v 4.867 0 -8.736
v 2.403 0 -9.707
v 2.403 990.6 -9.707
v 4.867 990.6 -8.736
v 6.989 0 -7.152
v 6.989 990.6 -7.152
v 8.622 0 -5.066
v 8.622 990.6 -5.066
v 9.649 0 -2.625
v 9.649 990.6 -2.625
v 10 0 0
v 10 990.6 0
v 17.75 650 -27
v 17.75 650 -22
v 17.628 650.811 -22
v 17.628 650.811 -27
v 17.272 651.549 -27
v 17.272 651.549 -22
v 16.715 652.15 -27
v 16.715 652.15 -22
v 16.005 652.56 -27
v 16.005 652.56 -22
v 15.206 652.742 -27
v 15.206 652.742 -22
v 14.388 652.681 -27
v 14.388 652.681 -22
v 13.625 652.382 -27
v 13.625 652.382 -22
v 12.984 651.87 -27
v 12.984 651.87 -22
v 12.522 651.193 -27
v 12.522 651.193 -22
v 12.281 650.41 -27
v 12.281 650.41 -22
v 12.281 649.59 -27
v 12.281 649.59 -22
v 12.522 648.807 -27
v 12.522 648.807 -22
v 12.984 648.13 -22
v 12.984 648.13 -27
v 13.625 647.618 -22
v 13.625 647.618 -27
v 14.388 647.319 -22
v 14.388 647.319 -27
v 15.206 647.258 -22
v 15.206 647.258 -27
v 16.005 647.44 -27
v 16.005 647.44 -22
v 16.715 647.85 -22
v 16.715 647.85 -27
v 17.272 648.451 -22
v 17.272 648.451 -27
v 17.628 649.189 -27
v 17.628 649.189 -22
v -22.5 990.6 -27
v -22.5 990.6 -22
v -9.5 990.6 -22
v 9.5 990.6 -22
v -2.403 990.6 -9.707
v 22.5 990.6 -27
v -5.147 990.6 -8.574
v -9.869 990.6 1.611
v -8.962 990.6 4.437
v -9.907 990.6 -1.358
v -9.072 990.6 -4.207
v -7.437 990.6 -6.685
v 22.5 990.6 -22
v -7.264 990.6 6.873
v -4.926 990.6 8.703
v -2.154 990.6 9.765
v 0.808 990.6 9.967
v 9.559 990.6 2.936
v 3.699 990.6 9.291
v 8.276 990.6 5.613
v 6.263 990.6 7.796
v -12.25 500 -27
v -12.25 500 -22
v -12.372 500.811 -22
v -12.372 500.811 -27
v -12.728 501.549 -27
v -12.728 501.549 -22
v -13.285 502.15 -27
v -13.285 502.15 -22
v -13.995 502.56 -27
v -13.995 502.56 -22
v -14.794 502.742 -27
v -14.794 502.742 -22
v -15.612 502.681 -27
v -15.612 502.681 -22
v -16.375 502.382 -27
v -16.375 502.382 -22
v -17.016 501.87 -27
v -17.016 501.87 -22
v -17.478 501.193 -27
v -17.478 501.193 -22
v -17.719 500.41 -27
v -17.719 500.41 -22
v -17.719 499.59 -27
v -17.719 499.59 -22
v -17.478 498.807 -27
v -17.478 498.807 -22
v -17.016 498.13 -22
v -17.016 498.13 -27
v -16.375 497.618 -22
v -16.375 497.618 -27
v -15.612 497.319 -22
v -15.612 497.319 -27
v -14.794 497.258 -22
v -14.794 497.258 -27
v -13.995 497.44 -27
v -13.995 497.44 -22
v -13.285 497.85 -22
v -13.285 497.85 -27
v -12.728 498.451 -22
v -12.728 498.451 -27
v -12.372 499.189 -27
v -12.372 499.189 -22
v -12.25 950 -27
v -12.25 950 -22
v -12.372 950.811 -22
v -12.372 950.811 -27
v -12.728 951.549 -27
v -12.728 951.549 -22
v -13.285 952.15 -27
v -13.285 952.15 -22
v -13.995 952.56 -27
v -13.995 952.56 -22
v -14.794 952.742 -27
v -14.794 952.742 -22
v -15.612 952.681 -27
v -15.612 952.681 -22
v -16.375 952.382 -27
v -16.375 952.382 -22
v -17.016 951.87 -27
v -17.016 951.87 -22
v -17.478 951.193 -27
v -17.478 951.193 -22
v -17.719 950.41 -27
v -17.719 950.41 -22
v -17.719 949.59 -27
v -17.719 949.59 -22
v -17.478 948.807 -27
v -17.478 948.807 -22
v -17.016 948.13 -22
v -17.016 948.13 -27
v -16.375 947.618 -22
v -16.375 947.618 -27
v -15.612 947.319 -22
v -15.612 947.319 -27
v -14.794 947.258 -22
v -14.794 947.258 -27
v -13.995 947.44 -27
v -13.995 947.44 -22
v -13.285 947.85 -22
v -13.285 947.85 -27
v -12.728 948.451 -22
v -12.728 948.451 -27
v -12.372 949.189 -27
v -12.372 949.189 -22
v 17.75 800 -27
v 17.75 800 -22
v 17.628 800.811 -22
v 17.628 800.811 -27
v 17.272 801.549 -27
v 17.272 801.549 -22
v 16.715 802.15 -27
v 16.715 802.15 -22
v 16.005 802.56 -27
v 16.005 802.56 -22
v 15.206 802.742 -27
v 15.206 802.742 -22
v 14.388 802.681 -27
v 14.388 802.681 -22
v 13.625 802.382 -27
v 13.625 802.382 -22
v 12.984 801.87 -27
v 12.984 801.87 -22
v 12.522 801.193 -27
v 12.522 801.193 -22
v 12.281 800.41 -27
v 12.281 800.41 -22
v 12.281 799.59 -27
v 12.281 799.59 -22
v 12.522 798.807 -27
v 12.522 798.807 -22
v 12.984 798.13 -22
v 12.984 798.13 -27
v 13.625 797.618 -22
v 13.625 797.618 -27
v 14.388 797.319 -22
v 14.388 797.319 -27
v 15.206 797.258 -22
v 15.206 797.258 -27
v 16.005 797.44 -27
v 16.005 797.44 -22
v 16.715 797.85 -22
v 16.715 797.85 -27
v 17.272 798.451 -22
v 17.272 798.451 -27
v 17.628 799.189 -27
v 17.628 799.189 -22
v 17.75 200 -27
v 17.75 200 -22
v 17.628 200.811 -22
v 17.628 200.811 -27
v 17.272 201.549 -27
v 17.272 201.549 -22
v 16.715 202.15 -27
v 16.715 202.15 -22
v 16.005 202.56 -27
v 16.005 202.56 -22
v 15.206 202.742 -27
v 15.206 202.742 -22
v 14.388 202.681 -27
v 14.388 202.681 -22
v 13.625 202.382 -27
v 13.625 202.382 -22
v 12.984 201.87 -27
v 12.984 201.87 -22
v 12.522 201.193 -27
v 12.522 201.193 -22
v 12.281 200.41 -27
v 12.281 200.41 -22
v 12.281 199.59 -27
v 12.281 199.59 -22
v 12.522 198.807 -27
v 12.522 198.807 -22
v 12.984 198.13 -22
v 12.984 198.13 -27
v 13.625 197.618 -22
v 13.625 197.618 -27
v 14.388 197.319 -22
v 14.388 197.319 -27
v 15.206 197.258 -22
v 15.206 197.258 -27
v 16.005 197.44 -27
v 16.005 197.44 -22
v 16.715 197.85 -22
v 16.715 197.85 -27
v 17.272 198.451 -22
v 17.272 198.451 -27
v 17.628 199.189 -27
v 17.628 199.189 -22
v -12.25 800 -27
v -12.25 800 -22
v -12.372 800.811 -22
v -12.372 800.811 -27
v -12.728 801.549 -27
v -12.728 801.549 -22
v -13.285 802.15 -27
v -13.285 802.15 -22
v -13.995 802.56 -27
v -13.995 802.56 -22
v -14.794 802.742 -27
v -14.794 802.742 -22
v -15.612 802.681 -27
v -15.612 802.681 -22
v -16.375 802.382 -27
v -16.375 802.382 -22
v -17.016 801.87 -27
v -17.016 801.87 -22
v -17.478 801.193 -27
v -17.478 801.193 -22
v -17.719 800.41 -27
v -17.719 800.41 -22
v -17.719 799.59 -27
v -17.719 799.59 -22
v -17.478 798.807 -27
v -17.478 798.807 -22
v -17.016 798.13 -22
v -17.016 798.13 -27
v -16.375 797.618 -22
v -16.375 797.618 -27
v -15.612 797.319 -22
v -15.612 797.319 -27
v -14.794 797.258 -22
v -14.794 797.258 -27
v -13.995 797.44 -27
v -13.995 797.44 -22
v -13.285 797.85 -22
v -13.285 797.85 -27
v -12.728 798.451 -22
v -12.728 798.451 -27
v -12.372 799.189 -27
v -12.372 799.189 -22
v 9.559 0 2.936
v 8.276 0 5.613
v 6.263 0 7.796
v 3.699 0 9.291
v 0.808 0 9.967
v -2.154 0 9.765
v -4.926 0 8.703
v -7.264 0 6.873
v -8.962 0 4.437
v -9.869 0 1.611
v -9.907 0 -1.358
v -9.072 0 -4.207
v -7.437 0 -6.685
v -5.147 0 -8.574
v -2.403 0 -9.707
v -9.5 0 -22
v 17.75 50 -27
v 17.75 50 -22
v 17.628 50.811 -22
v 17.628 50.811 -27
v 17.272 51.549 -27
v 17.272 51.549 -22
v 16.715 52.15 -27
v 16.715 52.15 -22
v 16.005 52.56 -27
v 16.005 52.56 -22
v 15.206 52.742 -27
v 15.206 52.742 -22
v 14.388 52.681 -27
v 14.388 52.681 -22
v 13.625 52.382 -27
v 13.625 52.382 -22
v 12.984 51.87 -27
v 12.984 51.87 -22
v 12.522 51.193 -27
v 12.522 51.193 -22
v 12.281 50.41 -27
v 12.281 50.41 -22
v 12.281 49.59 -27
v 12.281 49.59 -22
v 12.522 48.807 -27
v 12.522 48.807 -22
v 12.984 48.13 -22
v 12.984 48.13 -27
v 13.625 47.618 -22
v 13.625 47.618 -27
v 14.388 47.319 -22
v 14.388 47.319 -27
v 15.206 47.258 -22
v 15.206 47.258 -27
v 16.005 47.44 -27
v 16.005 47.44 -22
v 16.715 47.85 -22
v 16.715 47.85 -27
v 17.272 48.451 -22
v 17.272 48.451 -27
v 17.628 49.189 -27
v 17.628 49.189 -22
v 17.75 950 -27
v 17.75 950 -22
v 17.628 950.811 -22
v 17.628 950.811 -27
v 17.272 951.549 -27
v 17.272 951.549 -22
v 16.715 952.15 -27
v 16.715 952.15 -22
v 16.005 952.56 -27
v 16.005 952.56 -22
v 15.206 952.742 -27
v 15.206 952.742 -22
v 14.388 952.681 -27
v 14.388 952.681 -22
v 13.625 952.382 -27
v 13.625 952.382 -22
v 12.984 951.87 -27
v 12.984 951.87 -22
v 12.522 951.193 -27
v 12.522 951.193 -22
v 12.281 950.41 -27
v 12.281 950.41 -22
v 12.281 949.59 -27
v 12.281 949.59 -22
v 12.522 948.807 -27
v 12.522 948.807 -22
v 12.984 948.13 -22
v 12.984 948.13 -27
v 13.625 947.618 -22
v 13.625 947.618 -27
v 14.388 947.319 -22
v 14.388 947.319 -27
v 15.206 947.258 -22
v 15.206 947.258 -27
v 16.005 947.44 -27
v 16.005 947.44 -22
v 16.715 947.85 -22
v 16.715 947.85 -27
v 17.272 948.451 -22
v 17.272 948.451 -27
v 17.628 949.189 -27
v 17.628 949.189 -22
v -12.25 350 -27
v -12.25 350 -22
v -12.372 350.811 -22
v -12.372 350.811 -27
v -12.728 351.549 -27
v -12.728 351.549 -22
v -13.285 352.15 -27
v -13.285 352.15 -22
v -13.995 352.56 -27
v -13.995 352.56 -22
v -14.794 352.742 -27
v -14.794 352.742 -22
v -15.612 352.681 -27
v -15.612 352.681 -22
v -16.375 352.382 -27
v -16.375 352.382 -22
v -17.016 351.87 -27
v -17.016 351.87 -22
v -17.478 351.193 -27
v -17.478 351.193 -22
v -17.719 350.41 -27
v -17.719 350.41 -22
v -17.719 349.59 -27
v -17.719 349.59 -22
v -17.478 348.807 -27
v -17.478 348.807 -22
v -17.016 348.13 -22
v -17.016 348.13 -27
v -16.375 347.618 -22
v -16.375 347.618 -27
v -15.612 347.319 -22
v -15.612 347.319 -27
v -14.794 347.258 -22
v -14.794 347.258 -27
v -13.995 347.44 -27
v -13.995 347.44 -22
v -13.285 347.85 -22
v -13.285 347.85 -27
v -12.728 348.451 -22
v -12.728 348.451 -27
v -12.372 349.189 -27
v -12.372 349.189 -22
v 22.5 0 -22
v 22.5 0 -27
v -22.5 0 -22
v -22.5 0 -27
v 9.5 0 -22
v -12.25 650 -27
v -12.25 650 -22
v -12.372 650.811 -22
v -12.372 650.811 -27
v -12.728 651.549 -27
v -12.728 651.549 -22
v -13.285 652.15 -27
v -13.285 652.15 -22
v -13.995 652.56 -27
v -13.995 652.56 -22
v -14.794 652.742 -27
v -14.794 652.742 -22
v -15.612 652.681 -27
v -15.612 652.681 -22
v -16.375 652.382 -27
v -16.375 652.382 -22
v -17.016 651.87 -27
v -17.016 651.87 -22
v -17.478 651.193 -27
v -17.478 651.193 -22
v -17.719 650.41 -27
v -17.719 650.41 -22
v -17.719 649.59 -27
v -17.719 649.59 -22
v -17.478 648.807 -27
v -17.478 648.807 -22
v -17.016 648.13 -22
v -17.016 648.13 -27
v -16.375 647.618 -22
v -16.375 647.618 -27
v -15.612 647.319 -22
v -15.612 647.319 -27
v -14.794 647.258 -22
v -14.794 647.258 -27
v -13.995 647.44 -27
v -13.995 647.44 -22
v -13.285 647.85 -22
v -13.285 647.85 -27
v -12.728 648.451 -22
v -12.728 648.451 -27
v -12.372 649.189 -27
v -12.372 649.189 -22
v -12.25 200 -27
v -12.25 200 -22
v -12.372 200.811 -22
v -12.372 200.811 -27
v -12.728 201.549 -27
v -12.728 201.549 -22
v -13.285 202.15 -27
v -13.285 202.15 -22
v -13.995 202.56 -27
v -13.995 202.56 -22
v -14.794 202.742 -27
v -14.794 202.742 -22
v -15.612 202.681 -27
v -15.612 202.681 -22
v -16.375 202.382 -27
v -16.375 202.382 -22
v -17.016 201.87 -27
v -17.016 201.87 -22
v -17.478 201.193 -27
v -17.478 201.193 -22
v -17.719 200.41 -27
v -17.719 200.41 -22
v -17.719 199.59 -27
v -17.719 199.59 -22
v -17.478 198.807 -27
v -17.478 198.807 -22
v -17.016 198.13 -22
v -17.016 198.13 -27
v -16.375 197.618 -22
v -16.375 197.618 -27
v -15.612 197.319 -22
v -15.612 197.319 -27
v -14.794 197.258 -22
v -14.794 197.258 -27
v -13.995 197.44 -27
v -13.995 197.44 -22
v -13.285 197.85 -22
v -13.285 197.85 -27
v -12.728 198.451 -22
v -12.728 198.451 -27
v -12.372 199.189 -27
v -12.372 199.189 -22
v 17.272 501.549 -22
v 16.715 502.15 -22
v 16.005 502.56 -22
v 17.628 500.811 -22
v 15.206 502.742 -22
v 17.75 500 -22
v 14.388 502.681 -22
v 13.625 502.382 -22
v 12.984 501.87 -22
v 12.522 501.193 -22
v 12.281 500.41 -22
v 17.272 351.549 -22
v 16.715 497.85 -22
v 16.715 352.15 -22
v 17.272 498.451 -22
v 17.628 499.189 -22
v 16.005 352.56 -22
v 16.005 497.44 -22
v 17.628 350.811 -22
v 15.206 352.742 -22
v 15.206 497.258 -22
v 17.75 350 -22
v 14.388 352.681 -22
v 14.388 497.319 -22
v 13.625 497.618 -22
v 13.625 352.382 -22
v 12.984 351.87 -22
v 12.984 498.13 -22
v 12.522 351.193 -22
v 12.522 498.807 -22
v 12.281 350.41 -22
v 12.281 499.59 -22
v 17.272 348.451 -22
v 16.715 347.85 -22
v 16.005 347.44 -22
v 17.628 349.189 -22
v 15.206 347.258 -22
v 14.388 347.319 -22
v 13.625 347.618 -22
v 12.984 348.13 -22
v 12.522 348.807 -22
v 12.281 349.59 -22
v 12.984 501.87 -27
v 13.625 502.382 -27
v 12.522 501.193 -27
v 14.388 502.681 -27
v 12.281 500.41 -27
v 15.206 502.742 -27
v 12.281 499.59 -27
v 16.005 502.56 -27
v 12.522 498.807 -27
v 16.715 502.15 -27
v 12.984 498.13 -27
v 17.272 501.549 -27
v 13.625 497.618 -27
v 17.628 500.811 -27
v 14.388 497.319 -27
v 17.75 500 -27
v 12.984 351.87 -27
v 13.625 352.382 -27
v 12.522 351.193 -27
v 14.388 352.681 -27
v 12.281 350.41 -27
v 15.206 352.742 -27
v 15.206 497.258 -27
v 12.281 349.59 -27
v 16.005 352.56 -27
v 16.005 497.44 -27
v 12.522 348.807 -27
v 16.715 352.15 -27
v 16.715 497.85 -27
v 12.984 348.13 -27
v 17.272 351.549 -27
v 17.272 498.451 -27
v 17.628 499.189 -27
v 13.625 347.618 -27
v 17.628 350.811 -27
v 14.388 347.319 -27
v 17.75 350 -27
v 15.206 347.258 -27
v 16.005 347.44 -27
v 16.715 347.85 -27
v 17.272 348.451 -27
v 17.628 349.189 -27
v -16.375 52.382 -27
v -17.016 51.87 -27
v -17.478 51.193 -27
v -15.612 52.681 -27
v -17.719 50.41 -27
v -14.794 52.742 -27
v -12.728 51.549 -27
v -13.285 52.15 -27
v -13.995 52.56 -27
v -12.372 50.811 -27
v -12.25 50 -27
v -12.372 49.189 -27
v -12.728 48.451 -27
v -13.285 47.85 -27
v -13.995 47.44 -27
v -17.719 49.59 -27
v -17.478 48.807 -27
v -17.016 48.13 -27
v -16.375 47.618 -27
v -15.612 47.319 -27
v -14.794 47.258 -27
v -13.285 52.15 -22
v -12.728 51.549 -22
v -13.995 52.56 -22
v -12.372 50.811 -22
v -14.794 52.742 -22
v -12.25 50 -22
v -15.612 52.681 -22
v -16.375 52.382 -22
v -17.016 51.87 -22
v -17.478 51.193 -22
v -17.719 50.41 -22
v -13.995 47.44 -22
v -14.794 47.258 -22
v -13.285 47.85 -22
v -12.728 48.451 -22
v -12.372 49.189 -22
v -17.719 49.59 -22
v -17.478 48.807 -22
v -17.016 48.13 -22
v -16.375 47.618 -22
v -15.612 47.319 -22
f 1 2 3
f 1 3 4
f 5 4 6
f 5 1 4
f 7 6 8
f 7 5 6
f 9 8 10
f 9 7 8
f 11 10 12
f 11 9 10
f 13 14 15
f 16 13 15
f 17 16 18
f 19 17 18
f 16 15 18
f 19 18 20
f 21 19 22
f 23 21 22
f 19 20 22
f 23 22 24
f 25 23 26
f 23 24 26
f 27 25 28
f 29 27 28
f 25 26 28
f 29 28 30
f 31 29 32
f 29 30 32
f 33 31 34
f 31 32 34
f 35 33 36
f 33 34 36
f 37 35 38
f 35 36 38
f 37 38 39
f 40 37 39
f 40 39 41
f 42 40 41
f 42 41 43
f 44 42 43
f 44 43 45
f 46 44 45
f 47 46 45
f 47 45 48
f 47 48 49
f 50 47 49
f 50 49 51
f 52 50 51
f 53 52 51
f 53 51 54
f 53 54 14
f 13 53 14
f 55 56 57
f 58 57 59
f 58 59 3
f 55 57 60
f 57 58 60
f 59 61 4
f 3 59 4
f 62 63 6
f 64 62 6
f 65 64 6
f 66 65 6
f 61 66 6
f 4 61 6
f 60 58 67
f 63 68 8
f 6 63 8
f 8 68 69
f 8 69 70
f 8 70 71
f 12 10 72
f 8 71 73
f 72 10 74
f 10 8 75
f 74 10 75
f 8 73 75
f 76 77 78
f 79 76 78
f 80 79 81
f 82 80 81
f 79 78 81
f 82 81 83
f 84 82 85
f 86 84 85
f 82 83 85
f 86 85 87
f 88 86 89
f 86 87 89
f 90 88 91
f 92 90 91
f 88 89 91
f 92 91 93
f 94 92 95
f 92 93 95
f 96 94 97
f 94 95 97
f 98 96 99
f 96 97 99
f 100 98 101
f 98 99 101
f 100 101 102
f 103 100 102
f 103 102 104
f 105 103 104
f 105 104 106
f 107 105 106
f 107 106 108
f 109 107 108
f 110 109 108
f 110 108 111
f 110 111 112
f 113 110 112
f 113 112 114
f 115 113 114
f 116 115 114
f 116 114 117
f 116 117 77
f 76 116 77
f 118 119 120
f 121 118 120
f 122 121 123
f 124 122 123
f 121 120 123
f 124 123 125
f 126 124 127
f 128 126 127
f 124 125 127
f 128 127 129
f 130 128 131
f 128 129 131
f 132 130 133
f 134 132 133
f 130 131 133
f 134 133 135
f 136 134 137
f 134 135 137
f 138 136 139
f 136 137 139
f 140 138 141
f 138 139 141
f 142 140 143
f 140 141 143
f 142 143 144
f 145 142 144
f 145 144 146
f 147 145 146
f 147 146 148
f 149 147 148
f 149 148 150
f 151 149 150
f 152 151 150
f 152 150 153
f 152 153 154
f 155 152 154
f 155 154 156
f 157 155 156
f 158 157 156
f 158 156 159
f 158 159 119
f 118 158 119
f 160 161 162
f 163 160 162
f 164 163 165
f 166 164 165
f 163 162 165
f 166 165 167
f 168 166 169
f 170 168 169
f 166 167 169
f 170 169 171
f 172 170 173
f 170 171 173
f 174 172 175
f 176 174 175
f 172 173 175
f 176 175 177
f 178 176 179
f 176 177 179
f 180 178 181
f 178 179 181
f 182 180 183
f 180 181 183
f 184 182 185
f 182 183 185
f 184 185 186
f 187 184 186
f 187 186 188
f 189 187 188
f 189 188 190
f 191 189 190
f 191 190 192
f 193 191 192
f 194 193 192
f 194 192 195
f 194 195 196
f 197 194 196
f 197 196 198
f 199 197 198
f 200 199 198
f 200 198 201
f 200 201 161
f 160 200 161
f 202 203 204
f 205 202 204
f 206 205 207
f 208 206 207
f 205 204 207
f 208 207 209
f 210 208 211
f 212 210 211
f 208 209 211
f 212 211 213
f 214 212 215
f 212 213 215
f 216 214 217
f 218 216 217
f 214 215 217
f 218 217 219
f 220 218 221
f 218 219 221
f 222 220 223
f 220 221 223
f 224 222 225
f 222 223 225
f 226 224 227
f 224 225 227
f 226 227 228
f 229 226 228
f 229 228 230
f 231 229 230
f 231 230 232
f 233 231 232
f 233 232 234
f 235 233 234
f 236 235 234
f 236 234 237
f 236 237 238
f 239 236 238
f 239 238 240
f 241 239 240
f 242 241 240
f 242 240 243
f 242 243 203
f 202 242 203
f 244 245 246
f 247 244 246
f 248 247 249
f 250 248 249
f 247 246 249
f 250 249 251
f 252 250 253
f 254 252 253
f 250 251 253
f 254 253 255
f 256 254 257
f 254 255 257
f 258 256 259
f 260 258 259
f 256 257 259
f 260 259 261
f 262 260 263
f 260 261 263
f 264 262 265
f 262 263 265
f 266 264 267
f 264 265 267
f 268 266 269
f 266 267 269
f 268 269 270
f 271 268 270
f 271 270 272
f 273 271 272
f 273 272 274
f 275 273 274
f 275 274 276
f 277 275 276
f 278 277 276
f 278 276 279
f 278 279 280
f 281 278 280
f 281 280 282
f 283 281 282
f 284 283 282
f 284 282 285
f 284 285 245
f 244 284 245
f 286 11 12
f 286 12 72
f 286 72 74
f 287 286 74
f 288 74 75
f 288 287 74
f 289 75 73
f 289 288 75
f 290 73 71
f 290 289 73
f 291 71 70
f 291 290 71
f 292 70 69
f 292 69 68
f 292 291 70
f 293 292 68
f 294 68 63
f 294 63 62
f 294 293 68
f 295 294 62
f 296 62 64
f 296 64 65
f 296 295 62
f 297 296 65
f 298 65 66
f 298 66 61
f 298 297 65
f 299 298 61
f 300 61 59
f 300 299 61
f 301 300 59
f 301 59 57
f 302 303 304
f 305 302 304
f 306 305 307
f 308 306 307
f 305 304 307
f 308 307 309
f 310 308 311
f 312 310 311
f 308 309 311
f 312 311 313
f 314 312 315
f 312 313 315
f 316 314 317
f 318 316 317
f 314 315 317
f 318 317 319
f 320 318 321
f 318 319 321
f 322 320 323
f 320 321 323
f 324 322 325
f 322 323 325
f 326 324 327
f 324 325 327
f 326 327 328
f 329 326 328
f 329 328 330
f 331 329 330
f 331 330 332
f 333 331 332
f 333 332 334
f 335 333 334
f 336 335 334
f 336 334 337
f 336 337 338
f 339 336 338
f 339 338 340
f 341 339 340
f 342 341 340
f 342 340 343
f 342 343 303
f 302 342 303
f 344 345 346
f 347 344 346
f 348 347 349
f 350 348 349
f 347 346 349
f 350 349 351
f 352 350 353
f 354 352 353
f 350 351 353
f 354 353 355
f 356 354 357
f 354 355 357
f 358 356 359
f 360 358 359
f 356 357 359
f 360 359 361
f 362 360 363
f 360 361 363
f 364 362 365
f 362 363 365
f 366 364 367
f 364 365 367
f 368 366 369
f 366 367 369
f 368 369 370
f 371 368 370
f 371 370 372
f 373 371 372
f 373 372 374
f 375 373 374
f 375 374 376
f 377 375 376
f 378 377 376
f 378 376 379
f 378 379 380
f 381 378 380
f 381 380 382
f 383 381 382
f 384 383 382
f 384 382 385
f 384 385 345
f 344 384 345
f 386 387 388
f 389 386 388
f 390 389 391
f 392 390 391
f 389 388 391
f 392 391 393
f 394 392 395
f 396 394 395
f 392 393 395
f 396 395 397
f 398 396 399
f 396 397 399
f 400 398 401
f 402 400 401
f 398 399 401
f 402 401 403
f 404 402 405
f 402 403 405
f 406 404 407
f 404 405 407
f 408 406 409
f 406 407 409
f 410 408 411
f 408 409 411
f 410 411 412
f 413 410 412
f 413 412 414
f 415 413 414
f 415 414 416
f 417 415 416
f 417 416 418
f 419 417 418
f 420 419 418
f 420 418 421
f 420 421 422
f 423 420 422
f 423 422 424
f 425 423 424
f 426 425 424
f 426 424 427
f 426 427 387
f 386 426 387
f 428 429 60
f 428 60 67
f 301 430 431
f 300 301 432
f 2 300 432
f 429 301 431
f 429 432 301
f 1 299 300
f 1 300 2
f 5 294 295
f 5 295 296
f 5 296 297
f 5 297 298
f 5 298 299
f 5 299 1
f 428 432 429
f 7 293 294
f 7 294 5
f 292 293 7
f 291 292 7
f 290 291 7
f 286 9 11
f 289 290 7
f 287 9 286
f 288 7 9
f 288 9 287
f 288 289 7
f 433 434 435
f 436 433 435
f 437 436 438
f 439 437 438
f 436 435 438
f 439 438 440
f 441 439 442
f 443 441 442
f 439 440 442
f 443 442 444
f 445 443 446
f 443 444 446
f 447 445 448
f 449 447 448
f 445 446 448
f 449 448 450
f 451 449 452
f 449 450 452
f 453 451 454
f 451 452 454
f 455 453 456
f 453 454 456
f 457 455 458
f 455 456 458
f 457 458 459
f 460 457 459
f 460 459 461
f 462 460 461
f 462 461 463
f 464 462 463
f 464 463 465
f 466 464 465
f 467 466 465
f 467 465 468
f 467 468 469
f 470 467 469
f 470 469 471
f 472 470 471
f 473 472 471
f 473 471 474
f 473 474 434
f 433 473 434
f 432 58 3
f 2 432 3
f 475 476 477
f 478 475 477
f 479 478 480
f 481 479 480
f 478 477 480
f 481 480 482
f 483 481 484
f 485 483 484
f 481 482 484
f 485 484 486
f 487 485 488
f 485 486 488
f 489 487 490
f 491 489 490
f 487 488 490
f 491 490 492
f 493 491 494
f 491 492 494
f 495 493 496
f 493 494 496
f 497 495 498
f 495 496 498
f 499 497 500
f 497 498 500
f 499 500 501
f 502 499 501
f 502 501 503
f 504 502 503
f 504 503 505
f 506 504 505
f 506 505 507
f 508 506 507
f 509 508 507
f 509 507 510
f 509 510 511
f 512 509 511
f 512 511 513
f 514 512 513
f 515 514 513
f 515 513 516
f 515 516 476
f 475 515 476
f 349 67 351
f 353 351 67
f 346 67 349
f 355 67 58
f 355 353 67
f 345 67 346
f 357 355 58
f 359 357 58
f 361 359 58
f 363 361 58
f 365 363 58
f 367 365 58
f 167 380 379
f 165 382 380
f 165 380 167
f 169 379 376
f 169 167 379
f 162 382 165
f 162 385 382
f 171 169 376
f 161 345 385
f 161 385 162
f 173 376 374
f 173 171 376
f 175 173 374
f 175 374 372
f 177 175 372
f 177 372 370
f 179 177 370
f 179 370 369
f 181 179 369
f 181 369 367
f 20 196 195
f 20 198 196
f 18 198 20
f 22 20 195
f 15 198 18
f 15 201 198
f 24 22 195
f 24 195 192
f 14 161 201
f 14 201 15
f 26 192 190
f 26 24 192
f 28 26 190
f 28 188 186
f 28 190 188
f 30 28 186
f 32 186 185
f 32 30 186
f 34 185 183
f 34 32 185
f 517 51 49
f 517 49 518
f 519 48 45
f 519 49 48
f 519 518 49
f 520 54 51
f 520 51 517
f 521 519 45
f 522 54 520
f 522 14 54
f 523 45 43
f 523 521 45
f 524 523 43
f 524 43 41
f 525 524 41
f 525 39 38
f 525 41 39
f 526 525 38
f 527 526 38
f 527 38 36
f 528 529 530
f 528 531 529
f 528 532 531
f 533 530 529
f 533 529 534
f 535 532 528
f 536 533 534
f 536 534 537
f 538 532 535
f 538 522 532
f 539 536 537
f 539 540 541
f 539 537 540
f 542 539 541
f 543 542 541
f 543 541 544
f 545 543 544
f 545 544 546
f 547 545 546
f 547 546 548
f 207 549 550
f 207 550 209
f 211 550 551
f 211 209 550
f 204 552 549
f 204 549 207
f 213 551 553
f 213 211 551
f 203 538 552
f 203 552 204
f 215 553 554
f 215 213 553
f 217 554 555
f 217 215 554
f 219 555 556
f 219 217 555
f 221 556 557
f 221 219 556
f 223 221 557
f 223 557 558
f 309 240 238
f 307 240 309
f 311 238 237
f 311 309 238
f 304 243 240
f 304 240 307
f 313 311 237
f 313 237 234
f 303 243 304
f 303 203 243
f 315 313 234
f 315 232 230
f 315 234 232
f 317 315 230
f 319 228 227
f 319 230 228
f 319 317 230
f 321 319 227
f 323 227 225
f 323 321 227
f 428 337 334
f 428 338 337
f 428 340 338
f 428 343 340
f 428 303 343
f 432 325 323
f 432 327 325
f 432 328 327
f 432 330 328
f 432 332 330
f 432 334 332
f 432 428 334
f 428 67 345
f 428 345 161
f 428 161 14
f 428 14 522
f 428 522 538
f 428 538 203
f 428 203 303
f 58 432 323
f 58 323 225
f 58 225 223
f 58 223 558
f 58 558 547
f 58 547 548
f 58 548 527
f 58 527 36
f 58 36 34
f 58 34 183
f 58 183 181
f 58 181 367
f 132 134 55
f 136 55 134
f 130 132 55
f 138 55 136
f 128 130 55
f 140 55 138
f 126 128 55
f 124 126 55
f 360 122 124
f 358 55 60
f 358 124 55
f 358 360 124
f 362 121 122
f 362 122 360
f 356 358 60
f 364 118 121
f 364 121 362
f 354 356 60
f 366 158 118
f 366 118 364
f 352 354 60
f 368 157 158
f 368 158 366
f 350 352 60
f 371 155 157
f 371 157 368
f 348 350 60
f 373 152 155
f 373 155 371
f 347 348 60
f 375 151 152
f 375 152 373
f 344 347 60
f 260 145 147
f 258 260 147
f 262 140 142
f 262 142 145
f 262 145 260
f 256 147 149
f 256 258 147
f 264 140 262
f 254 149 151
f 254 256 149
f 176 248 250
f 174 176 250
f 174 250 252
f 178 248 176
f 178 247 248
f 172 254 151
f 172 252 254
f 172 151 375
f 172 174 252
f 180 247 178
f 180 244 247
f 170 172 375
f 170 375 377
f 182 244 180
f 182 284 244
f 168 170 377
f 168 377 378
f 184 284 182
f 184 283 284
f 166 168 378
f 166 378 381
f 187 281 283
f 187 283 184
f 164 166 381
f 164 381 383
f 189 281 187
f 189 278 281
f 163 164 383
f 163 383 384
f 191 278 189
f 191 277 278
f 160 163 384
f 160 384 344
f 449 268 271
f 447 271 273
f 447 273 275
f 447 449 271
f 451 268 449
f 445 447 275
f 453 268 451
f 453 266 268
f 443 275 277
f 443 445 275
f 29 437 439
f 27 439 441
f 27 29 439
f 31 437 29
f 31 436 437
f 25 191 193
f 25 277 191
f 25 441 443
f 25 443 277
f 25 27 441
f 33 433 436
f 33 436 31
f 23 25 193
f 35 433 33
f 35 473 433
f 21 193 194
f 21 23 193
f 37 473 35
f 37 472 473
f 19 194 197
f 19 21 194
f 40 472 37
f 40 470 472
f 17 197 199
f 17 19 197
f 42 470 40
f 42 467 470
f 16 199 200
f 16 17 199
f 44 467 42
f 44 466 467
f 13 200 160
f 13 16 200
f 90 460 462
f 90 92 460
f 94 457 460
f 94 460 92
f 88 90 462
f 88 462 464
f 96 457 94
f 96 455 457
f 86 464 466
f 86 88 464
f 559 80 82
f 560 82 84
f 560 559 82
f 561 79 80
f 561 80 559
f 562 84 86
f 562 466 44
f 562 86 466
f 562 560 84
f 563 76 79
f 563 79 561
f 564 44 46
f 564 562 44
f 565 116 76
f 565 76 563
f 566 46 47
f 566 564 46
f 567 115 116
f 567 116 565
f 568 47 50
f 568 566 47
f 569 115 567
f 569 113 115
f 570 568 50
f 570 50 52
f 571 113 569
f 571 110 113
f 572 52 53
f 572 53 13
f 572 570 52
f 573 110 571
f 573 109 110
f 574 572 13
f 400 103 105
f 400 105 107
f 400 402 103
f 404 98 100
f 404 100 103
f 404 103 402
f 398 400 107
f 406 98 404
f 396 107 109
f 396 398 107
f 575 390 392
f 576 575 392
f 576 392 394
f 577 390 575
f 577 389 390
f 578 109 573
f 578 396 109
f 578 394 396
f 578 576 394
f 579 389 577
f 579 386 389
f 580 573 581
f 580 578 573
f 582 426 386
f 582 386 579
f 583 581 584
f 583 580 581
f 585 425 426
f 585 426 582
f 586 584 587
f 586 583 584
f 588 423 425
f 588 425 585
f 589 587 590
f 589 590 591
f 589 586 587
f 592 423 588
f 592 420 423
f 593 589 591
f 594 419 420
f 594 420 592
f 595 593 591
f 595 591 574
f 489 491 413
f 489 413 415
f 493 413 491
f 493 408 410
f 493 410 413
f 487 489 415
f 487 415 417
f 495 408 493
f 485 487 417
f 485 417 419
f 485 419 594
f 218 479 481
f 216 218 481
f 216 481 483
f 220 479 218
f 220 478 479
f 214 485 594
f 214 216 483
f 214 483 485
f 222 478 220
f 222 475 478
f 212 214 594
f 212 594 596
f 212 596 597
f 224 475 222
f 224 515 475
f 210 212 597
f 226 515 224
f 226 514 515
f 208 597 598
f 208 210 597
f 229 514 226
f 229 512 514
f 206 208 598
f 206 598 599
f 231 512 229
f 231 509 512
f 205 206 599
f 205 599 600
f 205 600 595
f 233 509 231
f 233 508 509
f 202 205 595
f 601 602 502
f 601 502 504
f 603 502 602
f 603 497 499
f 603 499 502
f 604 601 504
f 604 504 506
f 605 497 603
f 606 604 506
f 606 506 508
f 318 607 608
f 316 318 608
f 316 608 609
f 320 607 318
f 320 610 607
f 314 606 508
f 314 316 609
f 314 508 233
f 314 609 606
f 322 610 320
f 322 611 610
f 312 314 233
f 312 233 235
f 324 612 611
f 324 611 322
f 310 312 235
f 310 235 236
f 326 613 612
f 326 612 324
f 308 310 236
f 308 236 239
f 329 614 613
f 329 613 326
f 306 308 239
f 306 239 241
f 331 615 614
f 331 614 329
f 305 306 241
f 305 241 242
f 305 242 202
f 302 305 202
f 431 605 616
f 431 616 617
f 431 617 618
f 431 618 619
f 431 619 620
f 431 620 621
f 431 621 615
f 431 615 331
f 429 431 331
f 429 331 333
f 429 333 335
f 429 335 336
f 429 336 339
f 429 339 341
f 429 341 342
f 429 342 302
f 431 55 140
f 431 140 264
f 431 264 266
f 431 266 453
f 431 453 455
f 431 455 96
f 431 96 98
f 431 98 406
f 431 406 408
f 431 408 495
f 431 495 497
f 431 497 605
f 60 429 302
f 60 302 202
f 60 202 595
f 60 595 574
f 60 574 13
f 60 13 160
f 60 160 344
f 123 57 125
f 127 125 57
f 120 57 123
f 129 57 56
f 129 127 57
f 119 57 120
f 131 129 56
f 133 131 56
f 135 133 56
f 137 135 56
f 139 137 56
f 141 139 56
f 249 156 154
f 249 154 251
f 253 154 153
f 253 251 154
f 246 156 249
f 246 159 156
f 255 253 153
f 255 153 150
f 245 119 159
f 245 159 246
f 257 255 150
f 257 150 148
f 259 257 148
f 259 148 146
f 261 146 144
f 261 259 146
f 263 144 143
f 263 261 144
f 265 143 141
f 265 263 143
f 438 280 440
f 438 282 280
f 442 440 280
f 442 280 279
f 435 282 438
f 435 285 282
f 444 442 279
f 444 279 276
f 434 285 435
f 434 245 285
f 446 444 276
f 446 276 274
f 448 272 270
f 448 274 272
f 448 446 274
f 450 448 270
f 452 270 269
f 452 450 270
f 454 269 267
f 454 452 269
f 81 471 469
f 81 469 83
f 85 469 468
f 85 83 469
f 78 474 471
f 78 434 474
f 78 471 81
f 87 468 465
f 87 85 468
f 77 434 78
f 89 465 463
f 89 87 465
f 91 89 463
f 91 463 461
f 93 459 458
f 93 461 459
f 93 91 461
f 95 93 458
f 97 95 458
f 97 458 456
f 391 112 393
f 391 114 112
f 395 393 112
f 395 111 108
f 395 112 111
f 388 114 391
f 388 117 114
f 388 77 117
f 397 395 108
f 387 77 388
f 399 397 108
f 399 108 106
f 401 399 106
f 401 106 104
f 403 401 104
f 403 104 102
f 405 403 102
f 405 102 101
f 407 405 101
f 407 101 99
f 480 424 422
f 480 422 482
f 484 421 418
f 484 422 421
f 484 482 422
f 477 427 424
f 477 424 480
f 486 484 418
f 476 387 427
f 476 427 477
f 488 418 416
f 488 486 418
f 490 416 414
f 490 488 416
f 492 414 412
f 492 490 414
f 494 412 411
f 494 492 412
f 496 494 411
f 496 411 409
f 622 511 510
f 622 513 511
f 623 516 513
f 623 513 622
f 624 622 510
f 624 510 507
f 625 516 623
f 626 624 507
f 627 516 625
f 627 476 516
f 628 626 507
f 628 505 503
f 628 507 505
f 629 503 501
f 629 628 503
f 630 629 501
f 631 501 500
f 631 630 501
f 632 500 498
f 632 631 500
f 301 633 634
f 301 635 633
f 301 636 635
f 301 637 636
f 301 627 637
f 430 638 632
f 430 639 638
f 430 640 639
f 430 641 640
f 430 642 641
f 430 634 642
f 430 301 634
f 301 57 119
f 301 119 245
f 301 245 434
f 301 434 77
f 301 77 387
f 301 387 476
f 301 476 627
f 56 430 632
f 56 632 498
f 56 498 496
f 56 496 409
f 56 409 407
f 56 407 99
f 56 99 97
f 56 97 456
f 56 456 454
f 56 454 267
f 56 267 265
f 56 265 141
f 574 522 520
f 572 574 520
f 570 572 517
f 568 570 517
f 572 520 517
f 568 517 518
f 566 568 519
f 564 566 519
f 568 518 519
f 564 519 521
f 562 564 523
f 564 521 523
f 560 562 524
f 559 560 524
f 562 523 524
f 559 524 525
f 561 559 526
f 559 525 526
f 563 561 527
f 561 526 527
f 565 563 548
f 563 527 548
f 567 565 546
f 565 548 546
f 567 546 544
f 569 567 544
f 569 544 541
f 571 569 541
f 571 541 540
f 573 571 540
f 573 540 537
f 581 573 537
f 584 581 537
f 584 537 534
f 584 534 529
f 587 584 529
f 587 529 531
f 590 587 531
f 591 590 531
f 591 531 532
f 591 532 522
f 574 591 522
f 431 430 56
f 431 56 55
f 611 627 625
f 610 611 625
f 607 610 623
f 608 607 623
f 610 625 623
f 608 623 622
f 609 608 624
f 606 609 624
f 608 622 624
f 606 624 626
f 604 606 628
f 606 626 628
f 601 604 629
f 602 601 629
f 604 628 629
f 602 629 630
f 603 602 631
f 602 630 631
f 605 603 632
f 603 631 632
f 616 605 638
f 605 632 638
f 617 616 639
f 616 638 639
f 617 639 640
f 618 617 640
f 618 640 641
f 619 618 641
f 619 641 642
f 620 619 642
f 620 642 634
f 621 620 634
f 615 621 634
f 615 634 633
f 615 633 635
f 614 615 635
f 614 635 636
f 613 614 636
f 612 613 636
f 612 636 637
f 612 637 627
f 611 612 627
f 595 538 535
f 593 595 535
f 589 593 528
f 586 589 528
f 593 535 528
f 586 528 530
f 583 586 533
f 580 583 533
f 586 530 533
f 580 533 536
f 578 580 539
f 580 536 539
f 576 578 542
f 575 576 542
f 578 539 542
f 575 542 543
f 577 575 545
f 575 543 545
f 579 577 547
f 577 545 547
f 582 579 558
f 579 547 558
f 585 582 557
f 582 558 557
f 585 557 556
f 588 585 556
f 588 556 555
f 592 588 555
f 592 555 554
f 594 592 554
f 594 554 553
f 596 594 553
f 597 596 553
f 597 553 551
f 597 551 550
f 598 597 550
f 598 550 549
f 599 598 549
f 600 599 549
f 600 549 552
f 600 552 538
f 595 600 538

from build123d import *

# Parameters (mm, degrees)
F1_DEPTH = 990.6
F2_R     = 2.75
F3_DEPTH = 25.4


with BuildPart() as f1:
    # F0 (on Front) → F1 (new body)
    with BuildSketch(Plane.XZ):
        with BuildLine():
            ThreePointArc((2.4026723012, -9.7070678278), (7.8748562848, -6.1633301464), (10, 0))
            ThreePointArc((10, 0), (-6.1633301464, 7.8748562848), (-2.4026723012, -9.7070678278))
            Line((-2.4026723012, -9.7070678278), (-2.0930662503, -9.1708144173))
            Line((-2.0930662503, -9.1708144173), (2.0930662503, -9.1708144173))
            Line((2.0930662503, -9.1708144173), (2.4026723012, -9.7070678278))
        make_face()
        with BuildLine():
            Line((-2.0930662503, -9.1708144173), (-2.4026723012, -9.7070678278))
            ThreePointArc((-2.4026723012, -9.7070678278), (0, -10), (2.4026723012, -9.7070678278))
            Line((2.4026723012, -9.7070678278), (2.0930662503, -9.1708144173))
            Line((2.0930662503, -9.1708144173), (-2.0930662503, -9.1708144173))
        make_face()
        with BuildLine():
            ThreePointArc((2.4026723012, -9.7070678278), (0, -10), (-2.4026723012, -9.7070678278))
            Line((-2.4026723012, -9.7070678278), (-9.5, -22))
            Line((-9.5, -22), (-22.5, -22))
            Line((-22.5, -22), (-22.5, -27))
            Line((-22.5, -27), (22.5, -27))
            Line((22.5, -27), (22.5, -22))
            Line((22.5, -22), (9.5, -22))
            Line((9.5, -22), (2.4026723012, -9.7070678278))
        make_face()
    extrude(amount=-F1_DEPTH)

    # F2 (on face) → F3 (cut)
    with BuildSketch(Plane.XY.offset(-22)):
        with Locations((15, 50)):
            Circle(F2_R)
        with Locations((-15, 50)):
            Circle(F2_R)
        with Locations((15, 200)):
            Circle(F2_R)
        with Locations((-15, 200)):
            Circle(F2_R)
        with Locations((15, 350)):
            Circle(F2_R)
        with Locations((-15, 350)):
            Circle(F2_R)
        with Locations((15, 500)):
            Circle(F2_R)
        with Locations((-15, 500)):
            Circle(F2_R)
        with Locations((15, 650)):
            Circle(F2_R)
        with Locations((-15, 650)):
            Circle(F2_R)
        with Locations((15, 800)):
            Circle(F2_R)
        with Locations((-15, 800)):
            Circle(F2_R)
        with Locations((15, 950)):
            Circle(F2_R)
        with Locations((-15, 950)):
            Circle(F2_R)
        with Locations((88.152, 50)):
            Circle(F2_R)
        with Locations((58.152, 50)):
            Circle(F2_R)
        with Locations((88.152, 200)):
            Circle(F2_R)
        with Locations((58.152, 200)):
            Circle(F2_R)
        with Locations((88.152, 350)):
            Circle(F2_R)
        with Locations((58.152, 350)):
            Circle(F2_R)
        with Locations((88.152, 500)):
            Circle(F2_R)
        with Locations((58.152, 500)):
            Circle(F2_R)
        with Locations((88.152, 650)):
            Circle(F2_R)
        with Locations((58.152, 650)):
            Circle(F2_R)
        with Locations((88.152, 800)):
            Circle(F2_R)
        with Locations((58.152, 800)):
            Circle(F2_R)
        with Locations((88.152, 950)):
            Circle(F2_R)
        with Locations((58.152, 950)):
            Circle(F2_R)
        with Locations((161.304, 50)):
            Circle(F2_R)
        with Locations((131.304, 50)):
            Circle(F2_R)
        with Locations((161.304, 200)):
            Circle(F2_R)
        with Locations((131.304, 200)):
            Circle(F2_R)
        with Locations((161.304, 350)):
            Circle(F2_R)
        with Locations((131.304, 350)):
            Circle(F2_R)
        with Locations((161.304, 500)):
            Circle(F2_R)
        with Locations((131.304, 500)):
            Circle(F2_R)
        with Locations((161.304, 650)):
            Circle(F2_R)
        with Locations((131.304, 650)):
            Circle(F2_R)
        with Locations((161.304, 800)):
            Circle(F2_R)
        with Locations((131.304, 800)):
            Circle(F2_R)
        with Locations((161.304, 950)):
            Circle(F2_R)
        with Locations((131.304, 950)):
            Circle(F2_R)
    extrude(amount=-F3_DEPTH, mode=Mode.SUBTRACT)


solid = f1.part
